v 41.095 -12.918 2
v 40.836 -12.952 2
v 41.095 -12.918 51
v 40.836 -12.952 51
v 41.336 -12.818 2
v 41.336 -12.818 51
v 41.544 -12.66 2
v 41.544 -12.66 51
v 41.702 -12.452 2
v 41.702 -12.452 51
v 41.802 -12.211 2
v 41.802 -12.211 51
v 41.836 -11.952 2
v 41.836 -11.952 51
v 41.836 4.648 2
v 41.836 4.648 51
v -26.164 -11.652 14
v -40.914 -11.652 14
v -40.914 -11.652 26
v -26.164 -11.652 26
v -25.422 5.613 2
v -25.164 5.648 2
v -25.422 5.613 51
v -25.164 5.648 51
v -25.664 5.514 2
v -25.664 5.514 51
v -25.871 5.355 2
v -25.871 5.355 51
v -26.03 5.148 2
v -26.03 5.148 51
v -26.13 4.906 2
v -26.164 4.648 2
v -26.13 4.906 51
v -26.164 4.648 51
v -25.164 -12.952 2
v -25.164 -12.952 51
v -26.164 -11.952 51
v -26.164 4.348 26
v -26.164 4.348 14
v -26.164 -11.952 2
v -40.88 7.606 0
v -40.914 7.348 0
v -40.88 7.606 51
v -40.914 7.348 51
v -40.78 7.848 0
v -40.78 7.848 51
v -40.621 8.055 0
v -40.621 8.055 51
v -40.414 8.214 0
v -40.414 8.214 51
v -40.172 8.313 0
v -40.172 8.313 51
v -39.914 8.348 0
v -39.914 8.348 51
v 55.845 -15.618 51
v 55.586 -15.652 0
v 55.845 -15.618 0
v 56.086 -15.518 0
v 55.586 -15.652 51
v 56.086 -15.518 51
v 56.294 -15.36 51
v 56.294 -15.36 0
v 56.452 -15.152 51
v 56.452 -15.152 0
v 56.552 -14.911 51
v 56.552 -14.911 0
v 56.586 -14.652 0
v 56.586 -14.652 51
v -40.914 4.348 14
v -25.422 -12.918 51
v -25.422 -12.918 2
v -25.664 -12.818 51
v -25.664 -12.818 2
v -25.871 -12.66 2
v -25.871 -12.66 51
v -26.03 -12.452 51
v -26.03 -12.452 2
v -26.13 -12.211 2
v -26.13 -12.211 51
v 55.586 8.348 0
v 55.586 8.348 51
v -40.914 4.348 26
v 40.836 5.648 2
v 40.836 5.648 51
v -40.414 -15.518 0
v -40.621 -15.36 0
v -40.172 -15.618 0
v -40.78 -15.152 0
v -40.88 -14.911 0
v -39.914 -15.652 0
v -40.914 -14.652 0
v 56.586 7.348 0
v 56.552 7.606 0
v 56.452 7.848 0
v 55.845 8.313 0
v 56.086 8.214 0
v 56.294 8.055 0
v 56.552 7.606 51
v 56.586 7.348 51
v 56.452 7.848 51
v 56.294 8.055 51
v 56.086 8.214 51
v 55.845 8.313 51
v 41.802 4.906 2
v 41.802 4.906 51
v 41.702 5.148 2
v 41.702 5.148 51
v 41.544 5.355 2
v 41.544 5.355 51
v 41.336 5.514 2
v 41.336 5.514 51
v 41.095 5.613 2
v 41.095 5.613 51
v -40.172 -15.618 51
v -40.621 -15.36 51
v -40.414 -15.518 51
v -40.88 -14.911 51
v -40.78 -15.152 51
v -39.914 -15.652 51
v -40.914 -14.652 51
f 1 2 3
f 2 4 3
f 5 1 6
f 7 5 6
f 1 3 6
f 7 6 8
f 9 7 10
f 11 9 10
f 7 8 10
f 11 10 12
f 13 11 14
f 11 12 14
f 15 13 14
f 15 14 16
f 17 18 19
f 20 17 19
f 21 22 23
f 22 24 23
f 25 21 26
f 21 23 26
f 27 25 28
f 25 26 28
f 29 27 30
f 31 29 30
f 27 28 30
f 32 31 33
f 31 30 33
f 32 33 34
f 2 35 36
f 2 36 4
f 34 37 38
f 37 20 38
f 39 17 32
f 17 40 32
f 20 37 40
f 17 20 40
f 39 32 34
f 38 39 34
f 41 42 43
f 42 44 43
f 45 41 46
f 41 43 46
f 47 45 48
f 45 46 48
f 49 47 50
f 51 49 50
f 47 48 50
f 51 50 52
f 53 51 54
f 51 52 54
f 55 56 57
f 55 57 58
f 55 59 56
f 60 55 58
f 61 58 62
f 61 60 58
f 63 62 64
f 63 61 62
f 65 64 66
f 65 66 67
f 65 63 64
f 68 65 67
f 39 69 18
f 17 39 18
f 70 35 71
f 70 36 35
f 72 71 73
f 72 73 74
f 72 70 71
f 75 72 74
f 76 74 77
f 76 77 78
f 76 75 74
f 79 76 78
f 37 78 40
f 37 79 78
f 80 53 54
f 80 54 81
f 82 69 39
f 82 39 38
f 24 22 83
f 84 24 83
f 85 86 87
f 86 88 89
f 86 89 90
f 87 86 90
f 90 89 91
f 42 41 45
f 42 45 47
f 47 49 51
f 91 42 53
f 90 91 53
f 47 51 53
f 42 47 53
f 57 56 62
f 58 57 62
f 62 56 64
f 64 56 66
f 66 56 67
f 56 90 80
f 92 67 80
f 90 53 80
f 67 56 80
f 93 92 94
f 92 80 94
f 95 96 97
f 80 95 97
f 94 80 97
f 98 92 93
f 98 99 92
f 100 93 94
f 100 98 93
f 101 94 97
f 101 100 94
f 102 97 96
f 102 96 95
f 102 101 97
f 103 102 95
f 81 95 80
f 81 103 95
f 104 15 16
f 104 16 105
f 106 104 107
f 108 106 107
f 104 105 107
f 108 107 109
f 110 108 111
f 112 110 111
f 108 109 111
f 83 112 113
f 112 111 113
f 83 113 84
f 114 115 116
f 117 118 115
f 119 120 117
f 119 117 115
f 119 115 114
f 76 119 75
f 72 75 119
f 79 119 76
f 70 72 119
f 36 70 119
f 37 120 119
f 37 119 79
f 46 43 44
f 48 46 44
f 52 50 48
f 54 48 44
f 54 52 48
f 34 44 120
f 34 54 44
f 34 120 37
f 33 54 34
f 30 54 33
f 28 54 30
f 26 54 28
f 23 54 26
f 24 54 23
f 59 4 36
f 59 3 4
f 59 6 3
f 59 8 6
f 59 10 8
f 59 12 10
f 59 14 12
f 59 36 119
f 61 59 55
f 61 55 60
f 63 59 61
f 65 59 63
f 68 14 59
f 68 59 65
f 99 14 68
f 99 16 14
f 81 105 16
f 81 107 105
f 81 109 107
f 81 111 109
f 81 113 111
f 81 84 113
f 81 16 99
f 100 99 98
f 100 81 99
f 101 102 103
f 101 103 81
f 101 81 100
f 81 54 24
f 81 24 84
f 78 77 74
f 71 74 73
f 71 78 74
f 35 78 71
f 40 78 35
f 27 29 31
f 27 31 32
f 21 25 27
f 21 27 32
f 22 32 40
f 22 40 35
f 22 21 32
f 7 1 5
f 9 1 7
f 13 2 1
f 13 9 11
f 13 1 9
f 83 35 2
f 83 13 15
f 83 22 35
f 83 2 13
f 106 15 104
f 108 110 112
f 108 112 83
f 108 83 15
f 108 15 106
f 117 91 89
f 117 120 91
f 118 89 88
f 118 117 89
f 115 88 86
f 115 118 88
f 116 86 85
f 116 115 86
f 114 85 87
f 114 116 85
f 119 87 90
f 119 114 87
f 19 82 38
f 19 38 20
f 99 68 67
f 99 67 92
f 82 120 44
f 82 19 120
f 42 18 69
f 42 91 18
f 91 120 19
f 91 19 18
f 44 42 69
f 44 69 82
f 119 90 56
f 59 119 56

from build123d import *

# Parameters (mm, degrees)
F0_W     = 97.5
F0_H     = 24
F0_W_2   = 68
F0_H_2   = 18.6
F1_DEPTH = 51
F2_DEPTH = 2
F3_W     = 16
F3_H     = 12
F4_DEPTH = 25
F5_R     = 1


with BuildPart() as f1:
    # F0 (on Top) → F1 (new body)
    with BuildSketch(Plane.XY):
        with Locations((7.836403, -3.65245)):
            Rectangle(F0_W, F0_H)
        with Locations((7.836403, -3.65245)):
            Rectangle(F0_W_2, F0_H_2, mode=Mode.SUBTRACT)
    extrude(amount=F1_DEPTH)

    # F0 (on Top) → F2 (join)
    with BuildSketch(Plane.XY):
        with Locations((7.836403, -3.65245)):
            Rectangle(F0_W_2, F0_H_2)
    extrude(amount=F2_DEPTH)

    # F3 (on face) → F4 (cut)
    with BuildSketch(Plane(origin=(-40.913597, 0, 0), x_dir=(0, -1, 0), z_dir=(-1, 0, 0))):
        with Locations((3.65245, 20)):
            Rectangle(F3_W, F3_H)
    extrude(amount=-F4_DEPTH, mode=Mode.SUBTRACT)

    # F5
    f5_edges = [f1.edges().sort_by_distance(p)[0] for p in [
        (-40.913597, -15.65245, 25.5),
        (-40.913597, 8.34755, 25.5),
        (56.586403, -15.65245, 25.5),
        (56.586403, 8.34755, 25.5),
        (41.836403, 5.64755, 26.5),
        (41.836403, -12.95245, 26.5),
        (-26.163597, 5.64755, 26.5),
        (-26.163597, -12.95245, 26.5),
    ]]
    fillet(f5_edges, radius=F5_R)


solid = f1.part
